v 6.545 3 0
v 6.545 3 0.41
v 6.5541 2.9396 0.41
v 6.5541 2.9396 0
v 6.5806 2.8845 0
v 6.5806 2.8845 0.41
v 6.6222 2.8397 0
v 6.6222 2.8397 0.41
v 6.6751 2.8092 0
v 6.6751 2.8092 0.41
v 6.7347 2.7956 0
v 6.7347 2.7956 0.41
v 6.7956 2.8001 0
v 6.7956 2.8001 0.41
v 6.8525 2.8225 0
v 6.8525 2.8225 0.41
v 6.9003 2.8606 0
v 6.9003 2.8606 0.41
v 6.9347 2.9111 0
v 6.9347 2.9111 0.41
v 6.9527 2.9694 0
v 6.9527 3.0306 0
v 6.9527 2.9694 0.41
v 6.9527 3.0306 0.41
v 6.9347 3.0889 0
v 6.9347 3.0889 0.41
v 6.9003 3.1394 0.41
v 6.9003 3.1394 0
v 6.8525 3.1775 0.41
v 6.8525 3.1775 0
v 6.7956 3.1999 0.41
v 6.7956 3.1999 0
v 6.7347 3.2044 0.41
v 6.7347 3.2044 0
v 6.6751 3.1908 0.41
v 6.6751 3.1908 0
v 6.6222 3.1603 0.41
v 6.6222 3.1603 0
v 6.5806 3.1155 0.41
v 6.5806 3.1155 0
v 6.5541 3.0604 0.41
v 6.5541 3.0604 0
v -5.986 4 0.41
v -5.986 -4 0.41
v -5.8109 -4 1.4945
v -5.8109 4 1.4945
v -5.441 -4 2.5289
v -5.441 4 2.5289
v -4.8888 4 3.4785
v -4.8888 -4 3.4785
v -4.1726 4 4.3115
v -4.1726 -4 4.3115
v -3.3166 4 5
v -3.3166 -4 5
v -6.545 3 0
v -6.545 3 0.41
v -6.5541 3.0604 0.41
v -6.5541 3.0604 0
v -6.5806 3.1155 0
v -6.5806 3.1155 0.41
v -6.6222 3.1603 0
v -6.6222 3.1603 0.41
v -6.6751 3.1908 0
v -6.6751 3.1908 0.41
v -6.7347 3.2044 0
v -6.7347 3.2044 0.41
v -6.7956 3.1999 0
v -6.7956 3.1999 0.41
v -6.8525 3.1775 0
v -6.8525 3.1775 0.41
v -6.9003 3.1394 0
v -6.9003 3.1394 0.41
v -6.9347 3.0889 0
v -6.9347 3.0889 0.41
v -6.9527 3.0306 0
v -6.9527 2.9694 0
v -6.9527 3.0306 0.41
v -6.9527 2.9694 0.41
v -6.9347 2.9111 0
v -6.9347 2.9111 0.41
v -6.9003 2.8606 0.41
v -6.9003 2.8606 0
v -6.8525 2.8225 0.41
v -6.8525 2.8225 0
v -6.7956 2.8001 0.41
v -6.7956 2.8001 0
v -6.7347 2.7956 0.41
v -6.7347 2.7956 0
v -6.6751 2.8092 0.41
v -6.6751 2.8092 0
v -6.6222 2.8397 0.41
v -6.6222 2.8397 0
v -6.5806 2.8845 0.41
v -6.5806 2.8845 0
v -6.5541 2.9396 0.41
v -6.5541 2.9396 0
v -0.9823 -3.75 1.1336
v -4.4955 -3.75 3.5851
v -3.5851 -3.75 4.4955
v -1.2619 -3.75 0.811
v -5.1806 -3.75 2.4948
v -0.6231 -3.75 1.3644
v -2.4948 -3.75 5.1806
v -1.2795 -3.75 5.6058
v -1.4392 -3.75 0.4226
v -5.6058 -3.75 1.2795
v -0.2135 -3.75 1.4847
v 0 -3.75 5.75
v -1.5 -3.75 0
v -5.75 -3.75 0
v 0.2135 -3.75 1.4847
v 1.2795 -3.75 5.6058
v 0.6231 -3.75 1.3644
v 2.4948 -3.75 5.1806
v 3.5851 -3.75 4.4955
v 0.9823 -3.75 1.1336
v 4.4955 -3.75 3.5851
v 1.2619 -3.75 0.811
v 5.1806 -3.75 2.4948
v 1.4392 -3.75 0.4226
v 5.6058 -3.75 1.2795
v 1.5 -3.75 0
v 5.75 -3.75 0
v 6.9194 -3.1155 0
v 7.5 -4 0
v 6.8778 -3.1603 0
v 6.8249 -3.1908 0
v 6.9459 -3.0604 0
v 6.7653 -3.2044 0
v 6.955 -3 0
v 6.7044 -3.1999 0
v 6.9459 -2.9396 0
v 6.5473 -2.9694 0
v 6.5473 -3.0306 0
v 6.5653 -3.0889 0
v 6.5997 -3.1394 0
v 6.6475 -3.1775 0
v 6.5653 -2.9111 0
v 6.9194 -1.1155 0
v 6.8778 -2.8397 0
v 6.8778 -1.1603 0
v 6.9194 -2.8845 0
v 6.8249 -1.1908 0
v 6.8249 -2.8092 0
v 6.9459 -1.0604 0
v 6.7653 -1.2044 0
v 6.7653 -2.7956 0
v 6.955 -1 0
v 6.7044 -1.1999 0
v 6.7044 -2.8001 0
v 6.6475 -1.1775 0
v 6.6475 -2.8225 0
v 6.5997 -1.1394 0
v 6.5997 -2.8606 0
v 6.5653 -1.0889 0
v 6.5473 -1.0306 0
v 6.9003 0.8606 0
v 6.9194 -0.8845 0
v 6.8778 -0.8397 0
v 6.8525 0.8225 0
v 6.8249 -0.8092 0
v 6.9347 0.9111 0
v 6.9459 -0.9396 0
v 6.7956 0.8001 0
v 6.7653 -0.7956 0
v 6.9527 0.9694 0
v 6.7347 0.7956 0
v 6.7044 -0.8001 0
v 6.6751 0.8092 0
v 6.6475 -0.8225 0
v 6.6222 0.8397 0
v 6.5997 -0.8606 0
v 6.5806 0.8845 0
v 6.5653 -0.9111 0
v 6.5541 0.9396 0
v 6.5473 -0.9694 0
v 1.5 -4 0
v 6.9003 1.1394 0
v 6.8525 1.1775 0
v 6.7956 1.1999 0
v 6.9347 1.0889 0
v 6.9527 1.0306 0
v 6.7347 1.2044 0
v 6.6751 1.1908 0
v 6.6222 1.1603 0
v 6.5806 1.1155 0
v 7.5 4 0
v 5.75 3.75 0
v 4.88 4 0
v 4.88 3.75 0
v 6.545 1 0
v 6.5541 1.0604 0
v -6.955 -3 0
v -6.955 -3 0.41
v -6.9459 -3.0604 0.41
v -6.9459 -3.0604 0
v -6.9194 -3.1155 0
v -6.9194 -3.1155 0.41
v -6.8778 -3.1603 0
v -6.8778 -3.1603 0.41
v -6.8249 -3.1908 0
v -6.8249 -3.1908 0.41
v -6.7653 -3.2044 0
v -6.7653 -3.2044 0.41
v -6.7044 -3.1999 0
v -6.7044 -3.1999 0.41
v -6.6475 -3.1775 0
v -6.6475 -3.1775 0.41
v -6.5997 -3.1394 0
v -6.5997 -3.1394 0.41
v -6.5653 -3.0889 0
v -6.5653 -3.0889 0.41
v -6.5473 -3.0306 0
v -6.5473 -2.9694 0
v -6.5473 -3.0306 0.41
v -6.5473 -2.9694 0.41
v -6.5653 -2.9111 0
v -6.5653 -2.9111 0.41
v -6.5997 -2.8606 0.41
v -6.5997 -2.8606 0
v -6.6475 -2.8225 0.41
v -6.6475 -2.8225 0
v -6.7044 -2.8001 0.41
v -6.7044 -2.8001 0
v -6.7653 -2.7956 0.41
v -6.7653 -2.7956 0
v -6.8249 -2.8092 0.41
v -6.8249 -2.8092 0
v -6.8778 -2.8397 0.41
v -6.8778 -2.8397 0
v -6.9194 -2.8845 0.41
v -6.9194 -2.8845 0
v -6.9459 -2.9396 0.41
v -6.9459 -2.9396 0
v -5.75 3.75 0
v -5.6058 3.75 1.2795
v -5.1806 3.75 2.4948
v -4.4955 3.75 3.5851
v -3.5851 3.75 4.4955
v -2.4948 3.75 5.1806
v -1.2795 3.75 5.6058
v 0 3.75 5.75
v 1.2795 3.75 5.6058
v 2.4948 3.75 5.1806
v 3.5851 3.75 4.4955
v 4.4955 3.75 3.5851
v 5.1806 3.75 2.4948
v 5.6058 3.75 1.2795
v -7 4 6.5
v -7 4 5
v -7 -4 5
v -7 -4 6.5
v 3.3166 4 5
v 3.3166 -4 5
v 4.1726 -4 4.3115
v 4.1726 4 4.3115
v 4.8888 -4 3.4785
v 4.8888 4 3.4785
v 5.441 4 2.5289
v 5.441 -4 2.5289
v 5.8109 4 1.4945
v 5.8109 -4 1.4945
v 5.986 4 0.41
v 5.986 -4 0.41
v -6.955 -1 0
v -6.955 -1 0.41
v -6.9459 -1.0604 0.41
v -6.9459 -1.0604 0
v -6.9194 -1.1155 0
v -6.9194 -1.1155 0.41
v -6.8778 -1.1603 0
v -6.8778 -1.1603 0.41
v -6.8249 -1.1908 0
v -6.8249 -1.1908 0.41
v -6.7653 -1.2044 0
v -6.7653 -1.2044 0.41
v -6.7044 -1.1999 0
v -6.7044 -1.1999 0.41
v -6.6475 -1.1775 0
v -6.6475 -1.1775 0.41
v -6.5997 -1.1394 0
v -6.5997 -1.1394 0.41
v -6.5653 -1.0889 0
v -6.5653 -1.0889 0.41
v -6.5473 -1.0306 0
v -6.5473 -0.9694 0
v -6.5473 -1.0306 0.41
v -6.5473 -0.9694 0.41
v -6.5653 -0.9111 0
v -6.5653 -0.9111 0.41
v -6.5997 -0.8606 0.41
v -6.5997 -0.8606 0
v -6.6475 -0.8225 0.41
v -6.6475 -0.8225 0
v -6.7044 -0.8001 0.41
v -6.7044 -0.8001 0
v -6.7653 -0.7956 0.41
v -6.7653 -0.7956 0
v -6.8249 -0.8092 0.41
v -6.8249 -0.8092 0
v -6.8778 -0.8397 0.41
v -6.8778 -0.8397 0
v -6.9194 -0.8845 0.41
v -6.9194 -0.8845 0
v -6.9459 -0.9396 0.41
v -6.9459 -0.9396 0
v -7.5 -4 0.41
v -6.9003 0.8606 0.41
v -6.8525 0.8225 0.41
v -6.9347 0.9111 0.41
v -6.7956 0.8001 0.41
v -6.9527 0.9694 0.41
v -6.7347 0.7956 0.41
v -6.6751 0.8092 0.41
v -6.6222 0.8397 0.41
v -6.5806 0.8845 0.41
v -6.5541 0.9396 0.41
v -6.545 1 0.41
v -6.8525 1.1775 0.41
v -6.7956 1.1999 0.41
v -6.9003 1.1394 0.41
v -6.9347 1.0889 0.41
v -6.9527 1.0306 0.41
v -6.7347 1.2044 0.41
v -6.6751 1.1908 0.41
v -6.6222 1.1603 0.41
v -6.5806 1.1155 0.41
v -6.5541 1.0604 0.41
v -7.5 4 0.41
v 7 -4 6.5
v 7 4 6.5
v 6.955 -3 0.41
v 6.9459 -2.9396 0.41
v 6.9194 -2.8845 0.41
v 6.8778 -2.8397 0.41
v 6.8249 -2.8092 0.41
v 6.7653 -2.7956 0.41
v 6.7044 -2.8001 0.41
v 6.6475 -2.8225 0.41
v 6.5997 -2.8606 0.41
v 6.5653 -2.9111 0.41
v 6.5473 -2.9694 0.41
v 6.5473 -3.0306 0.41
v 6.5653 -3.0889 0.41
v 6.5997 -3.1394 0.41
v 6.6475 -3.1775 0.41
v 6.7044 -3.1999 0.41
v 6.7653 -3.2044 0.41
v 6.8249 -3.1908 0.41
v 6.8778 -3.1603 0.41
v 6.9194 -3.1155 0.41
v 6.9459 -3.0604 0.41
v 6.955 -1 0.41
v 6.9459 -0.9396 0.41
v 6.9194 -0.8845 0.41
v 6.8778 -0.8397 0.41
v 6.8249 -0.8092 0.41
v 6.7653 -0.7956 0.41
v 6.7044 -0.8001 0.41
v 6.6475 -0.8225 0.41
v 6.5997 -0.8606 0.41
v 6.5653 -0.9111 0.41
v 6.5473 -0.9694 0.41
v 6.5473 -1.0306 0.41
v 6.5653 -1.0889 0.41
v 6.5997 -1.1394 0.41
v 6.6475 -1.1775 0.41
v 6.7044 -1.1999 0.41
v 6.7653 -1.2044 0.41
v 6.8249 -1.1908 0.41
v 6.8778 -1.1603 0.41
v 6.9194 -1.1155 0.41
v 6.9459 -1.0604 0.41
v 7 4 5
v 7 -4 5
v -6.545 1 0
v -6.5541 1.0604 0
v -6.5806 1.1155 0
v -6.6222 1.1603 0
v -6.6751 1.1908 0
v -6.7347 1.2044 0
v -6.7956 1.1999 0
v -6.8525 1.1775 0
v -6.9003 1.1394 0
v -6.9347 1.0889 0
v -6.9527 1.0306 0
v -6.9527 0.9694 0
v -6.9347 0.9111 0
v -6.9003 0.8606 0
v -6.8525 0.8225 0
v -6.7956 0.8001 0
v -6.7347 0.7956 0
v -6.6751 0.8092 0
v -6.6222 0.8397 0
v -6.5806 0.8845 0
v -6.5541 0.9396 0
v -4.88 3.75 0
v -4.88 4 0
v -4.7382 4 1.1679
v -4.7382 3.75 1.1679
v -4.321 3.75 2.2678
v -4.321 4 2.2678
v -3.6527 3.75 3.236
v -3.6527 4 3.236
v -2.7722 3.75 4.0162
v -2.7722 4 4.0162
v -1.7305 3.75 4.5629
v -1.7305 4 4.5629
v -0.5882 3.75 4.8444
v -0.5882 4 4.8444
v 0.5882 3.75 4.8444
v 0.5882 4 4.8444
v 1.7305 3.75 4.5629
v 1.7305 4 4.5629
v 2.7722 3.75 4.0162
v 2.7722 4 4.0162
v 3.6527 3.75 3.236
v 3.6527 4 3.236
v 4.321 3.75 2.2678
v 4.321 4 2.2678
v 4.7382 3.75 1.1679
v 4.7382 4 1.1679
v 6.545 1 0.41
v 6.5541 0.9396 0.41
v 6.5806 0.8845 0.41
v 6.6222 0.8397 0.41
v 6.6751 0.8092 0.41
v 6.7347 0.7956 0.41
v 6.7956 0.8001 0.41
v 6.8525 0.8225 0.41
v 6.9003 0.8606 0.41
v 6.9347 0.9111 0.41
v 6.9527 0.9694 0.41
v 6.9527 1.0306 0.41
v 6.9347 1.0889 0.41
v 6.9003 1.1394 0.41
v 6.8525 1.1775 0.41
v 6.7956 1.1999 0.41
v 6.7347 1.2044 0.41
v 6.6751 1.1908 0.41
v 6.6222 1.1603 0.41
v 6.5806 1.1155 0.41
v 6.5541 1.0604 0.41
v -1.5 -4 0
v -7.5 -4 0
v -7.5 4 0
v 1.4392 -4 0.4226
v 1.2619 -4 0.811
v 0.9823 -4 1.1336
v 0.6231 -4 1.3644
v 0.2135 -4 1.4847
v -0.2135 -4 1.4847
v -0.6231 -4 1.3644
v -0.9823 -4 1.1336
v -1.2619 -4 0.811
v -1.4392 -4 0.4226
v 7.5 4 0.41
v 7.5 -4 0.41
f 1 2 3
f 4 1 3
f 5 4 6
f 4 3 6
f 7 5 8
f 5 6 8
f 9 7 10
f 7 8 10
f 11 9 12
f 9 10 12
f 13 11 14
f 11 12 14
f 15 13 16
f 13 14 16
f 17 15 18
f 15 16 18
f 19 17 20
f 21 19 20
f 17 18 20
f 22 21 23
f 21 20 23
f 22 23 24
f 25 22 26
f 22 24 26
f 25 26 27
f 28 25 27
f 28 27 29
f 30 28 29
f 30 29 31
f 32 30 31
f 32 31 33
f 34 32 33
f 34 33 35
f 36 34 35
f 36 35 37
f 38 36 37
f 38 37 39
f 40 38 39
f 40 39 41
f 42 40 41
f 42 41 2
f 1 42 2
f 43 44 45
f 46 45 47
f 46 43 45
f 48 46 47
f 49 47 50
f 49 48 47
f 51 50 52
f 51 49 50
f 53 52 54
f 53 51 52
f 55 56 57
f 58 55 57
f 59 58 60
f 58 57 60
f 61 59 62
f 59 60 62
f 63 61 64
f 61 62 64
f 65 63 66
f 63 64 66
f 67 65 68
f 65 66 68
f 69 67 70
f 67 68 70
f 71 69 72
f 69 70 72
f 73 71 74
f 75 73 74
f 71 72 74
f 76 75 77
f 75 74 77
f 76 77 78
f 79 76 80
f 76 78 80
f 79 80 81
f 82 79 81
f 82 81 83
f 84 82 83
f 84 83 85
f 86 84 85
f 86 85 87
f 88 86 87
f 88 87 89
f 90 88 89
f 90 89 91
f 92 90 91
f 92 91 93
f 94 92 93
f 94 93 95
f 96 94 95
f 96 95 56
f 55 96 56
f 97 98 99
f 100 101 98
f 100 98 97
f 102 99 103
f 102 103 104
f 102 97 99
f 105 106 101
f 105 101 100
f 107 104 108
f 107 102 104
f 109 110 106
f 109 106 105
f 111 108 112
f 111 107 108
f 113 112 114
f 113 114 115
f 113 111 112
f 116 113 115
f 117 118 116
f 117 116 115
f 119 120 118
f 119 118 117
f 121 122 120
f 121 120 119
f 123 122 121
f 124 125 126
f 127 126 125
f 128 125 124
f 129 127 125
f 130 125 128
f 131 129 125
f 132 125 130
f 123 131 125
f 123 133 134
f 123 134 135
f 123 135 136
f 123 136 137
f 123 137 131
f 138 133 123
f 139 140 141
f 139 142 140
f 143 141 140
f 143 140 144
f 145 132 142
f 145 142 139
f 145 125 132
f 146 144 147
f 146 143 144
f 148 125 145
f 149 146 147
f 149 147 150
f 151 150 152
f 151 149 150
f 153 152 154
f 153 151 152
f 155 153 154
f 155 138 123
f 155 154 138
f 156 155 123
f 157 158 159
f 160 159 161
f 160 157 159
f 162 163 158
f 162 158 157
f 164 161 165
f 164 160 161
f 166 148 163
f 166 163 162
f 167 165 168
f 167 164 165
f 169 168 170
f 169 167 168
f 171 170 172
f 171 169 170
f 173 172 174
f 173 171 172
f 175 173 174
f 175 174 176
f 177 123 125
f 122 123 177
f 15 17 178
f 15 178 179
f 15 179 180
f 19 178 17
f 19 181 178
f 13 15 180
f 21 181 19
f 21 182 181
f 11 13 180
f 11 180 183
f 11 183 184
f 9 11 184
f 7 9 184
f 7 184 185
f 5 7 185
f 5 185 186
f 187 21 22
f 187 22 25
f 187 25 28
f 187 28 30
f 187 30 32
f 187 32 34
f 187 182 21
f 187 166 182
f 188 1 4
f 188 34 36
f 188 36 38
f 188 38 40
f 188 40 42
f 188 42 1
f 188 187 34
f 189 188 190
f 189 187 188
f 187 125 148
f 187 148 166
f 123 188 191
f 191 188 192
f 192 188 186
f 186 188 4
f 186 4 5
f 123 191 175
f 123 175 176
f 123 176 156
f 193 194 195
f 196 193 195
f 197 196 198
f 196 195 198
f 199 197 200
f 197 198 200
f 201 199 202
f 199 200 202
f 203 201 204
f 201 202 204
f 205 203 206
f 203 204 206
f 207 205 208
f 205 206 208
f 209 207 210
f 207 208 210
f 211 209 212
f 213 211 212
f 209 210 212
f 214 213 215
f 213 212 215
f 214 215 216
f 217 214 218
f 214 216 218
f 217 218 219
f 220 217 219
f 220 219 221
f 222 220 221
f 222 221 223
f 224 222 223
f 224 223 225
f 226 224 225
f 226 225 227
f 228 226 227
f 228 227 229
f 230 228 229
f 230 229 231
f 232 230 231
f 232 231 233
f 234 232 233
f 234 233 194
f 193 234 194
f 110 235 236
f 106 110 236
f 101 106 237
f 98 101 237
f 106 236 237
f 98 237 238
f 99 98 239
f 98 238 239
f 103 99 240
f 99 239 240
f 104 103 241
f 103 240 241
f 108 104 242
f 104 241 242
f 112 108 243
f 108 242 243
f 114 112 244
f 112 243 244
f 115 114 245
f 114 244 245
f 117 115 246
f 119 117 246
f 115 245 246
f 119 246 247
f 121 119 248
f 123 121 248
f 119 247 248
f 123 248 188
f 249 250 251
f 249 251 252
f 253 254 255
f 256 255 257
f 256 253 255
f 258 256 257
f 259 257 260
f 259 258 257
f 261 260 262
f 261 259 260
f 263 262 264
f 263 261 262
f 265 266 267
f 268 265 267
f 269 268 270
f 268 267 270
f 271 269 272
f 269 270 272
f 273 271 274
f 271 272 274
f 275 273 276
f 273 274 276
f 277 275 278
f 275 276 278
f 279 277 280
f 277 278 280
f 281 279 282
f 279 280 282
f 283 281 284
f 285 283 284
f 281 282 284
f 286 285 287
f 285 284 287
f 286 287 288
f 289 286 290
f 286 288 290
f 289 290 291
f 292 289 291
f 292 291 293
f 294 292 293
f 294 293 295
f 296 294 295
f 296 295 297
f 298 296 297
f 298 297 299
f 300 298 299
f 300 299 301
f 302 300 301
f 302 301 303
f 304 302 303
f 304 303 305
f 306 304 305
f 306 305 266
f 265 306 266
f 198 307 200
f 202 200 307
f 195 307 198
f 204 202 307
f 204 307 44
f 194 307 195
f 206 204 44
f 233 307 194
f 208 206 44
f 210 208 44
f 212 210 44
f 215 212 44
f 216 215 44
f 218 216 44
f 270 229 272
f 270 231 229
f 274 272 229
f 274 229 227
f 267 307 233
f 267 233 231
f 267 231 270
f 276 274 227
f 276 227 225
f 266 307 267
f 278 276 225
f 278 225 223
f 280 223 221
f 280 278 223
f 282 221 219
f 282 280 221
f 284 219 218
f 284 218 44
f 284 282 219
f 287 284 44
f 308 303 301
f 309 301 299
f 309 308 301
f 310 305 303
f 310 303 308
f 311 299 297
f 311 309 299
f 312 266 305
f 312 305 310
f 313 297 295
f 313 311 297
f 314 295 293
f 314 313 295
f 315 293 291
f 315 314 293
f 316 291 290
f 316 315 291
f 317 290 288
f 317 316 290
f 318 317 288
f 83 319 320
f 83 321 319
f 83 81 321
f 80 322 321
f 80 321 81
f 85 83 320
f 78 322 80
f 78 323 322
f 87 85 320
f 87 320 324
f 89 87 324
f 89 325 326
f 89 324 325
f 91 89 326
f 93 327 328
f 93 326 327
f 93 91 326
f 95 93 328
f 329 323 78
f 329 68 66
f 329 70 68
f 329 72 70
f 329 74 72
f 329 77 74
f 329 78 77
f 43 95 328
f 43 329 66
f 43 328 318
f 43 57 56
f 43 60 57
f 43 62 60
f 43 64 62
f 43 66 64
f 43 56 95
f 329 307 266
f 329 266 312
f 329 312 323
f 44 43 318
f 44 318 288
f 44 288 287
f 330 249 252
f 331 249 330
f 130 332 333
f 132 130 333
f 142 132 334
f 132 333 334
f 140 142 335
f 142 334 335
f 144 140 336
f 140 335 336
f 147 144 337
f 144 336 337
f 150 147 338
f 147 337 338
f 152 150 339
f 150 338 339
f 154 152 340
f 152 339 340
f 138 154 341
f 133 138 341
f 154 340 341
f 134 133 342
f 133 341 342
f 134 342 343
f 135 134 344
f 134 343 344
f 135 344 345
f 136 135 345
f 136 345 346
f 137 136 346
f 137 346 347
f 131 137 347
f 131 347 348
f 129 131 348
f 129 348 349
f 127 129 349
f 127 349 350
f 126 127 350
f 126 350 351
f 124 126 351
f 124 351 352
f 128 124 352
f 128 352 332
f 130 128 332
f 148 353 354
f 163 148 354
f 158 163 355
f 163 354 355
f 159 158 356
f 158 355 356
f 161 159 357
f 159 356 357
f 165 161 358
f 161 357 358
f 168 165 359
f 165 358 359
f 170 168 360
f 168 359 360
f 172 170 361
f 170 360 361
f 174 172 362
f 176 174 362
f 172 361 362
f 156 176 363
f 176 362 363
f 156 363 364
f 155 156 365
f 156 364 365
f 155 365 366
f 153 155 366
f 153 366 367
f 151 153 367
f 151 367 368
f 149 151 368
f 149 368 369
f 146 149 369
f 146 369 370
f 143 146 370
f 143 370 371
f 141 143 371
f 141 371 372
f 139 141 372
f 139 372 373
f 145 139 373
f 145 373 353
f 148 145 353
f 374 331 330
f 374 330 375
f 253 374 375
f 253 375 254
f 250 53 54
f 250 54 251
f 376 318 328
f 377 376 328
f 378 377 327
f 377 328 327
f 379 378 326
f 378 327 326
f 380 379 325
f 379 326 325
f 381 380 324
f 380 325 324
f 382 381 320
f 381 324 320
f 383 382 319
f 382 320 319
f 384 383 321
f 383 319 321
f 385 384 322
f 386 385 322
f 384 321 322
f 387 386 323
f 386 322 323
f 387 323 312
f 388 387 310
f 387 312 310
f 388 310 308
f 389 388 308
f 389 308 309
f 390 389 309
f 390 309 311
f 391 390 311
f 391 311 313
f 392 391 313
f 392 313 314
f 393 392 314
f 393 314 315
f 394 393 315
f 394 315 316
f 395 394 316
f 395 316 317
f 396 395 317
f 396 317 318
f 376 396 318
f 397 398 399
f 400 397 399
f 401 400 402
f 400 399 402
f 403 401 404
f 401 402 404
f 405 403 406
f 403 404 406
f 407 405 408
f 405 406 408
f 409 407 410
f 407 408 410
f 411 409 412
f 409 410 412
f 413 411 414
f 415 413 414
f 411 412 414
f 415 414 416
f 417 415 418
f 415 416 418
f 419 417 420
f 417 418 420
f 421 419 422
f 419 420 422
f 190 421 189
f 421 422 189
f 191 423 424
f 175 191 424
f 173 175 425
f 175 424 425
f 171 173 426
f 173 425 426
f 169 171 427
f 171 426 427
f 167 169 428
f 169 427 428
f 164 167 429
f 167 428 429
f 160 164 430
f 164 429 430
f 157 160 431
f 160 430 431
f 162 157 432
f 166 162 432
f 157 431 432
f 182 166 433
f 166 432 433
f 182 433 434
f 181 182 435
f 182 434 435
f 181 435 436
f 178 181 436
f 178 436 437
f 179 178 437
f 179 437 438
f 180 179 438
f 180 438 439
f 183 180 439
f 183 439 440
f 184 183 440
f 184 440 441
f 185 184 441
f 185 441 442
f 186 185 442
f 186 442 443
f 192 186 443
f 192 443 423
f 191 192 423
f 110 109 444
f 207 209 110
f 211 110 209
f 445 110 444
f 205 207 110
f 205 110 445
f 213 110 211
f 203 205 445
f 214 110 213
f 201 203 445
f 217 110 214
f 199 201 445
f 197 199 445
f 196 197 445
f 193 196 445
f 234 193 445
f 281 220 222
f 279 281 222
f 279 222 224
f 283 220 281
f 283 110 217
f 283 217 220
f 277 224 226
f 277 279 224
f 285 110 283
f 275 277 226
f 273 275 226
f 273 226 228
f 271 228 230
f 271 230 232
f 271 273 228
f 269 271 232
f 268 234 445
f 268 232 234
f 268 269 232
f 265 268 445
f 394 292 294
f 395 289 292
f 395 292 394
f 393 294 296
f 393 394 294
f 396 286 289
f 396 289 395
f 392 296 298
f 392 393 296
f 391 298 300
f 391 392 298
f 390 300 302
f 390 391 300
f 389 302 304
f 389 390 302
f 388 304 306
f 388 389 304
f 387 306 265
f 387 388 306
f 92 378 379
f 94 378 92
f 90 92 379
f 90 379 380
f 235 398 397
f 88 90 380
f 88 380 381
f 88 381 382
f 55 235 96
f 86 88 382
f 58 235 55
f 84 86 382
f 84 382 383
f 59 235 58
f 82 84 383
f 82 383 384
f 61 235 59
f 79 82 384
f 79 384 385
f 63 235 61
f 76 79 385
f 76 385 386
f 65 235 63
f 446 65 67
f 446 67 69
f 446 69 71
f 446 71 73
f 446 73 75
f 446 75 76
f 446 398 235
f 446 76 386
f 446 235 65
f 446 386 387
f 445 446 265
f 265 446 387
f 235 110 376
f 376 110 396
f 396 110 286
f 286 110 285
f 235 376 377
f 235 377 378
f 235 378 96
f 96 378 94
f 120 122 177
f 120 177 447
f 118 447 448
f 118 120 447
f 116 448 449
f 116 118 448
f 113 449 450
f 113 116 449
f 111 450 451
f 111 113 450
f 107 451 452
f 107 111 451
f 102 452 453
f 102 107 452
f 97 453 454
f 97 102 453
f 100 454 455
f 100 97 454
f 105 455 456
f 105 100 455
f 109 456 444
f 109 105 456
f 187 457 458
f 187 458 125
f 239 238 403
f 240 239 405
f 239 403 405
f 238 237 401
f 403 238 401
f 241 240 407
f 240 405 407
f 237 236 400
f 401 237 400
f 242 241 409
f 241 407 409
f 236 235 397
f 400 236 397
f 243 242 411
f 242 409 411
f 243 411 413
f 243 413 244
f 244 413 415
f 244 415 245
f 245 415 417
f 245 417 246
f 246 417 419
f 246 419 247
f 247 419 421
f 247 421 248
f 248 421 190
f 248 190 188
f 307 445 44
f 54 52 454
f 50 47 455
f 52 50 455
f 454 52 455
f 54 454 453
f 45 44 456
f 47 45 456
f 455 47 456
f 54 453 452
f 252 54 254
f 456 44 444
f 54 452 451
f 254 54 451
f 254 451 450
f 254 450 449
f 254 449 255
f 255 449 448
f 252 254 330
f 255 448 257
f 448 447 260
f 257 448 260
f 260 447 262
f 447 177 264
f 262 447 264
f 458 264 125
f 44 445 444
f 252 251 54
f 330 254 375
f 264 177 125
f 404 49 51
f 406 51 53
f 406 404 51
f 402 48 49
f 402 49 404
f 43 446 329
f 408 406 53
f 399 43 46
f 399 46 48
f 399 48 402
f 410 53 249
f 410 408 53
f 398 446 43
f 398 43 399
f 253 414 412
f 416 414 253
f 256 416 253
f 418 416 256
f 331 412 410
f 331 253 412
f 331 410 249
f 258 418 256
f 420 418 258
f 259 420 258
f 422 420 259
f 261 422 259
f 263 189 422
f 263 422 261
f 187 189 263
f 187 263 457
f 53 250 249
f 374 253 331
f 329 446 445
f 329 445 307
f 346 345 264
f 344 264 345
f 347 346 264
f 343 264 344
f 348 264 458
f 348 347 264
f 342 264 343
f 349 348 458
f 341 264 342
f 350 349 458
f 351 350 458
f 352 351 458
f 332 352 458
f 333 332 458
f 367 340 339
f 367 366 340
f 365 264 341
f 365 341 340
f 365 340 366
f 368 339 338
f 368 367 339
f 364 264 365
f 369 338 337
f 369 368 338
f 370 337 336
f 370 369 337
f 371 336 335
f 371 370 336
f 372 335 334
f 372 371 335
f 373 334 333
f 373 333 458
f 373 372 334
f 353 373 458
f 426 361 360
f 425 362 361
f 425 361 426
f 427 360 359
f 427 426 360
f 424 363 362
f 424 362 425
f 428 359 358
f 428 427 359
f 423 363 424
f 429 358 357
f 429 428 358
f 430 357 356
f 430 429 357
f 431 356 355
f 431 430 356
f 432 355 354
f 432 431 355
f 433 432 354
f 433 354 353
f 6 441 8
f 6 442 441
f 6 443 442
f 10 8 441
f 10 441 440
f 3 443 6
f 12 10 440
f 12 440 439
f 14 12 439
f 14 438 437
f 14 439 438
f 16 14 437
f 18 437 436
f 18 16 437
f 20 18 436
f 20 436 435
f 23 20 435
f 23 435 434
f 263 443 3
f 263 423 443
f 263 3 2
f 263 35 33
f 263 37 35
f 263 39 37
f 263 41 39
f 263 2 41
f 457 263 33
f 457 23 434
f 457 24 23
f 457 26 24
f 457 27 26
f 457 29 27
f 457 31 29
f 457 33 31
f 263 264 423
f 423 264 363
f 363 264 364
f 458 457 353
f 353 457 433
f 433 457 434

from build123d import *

# Parameters (mm, degrees)
BOSS_EXTRUDE2_DEPTH = 4
CUT_EXTRUDE1_DEPTH  = 3.75
CUT_EXTRUDE2_START  = 7.5
CUT_EXTRUDE2_DEPTH  = 7.5
SKETCH2_R           = 0.205
CUT_EXTRUDE3_DEPTH  = 7.5


with BuildPart() as part:
    # Sketch1 → Boss-Extrude2 (new, symmetric)
    with BuildSketch(Plane(origin=(0, 0, 0), x_dir=(1, 0, 0), z_dir=(0, 1, 0))):
        with BuildLine():
            Line((-7.5, 0), (-7.5, -0.41))
            Line((-7.5, -0.41), (-5.985975276, -0.41))
            ThreePointArc((-5.985975276, -0.41), (-5.186676874, -3.016352599), (-3.31662479, -5))
            Line((-3.31662479, -5), (-7, -5))
            Line((-7, -5), (-7, -6.5))
            Line((-7, -6.5), (7, -6.5))
            Line((7, -6.5), (7, -5))
            Line((7, -5), (3.31662479, -5))
            ThreePointArc((3.31662479, -5), (5.186676874, -3.016352599), (5.985975276, -0.41))
            Line((5.985975276, -0.41), (7.5, -0.41))
            Line((7.5, -0.41), (7.5, 0))
            Line((7.5, 0), (1.5, 0))
            ThreePointArc((1.5, 0), (0, -1.5), (-1.5, 0))
            Line((-1.5, 0), (-7.5, 0))
        make_face()
    extrude(amount=BOSS_EXTRUDE2_DEPTH, both=True)

    # Sketch1<3> → Cut-Extrude1 (cut, symmetric)
    with BuildSketch(Plane(origin=(0, 0, 0), x_dir=(1, 0, 0), z_dir=(0, 1, 0))):
        with BuildLine():
            ThreePointArc((-5.75, 0), (0, -5.75), (5.75, 0))
            Line((5.75, 0), (1.5, 0))
            ThreePointArc((1.5, 0), (0, -1.5), (-1.5, 0))
            Line((-1.5, 0), (-5.75, 0))
        make_face()
    extrude(amount=CUT_EXTRUDE1_DEPTH, both=True, mode=Mode.SUBTRACT)

    # Sketch1<4> → Cut-Extrude2 (cut)
    with BuildSketch(Plane(origin=(0, 0, 0), x_dir=(1, 0, 0), z_dir=(0, 1, 0)).offset(CUT_EXTRUDE2_START)):
        with BuildLine():
            Line((-1.5, 0), (-4.88, 0))
            ThreePointArc((-4.88, 0), (0, -4.88), (4.88, 0))
            Line((4.88, 0), (1.5, 0))
            ThreePointArc((1.5, 0), (0, -1.5), (-1.5, 0))
        make_face()
    extrude(amount=-CUT_EXTRUDE2_DEPTH, mode=Mode.SUBTRACT)

    # Sketch2 → Cut-Extrude3 (cut)
    with BuildSketch(Plane.XY.offset(0.41)):
        with Locations((-6.75, 3)):
            Circle(SKETCH2_R)
        with Locations((-6.75, 1)):
            Circle(SKETCH2_R)
        with Locations((-6.75, -1)):
            Circle(SKETCH2_R)
        with Locations((-6.75, -3)):
            Circle(SKETCH2_R)
        with Locations((6.75, -3)):
            Circle(SKETCH2_R)
        with Locations((6.75, -1)):
            Circle(SKETCH2_R)
        with Locations((6.75, 1)):
            Circle(SKETCH2_R)
        with Locations((6.75, 3)):
            Circle(SKETCH2_R)
    extrude(amount=-CUT_EXTRUDE3_DEPTH, mode=Mode.SUBTRACT)


solid = part.part
